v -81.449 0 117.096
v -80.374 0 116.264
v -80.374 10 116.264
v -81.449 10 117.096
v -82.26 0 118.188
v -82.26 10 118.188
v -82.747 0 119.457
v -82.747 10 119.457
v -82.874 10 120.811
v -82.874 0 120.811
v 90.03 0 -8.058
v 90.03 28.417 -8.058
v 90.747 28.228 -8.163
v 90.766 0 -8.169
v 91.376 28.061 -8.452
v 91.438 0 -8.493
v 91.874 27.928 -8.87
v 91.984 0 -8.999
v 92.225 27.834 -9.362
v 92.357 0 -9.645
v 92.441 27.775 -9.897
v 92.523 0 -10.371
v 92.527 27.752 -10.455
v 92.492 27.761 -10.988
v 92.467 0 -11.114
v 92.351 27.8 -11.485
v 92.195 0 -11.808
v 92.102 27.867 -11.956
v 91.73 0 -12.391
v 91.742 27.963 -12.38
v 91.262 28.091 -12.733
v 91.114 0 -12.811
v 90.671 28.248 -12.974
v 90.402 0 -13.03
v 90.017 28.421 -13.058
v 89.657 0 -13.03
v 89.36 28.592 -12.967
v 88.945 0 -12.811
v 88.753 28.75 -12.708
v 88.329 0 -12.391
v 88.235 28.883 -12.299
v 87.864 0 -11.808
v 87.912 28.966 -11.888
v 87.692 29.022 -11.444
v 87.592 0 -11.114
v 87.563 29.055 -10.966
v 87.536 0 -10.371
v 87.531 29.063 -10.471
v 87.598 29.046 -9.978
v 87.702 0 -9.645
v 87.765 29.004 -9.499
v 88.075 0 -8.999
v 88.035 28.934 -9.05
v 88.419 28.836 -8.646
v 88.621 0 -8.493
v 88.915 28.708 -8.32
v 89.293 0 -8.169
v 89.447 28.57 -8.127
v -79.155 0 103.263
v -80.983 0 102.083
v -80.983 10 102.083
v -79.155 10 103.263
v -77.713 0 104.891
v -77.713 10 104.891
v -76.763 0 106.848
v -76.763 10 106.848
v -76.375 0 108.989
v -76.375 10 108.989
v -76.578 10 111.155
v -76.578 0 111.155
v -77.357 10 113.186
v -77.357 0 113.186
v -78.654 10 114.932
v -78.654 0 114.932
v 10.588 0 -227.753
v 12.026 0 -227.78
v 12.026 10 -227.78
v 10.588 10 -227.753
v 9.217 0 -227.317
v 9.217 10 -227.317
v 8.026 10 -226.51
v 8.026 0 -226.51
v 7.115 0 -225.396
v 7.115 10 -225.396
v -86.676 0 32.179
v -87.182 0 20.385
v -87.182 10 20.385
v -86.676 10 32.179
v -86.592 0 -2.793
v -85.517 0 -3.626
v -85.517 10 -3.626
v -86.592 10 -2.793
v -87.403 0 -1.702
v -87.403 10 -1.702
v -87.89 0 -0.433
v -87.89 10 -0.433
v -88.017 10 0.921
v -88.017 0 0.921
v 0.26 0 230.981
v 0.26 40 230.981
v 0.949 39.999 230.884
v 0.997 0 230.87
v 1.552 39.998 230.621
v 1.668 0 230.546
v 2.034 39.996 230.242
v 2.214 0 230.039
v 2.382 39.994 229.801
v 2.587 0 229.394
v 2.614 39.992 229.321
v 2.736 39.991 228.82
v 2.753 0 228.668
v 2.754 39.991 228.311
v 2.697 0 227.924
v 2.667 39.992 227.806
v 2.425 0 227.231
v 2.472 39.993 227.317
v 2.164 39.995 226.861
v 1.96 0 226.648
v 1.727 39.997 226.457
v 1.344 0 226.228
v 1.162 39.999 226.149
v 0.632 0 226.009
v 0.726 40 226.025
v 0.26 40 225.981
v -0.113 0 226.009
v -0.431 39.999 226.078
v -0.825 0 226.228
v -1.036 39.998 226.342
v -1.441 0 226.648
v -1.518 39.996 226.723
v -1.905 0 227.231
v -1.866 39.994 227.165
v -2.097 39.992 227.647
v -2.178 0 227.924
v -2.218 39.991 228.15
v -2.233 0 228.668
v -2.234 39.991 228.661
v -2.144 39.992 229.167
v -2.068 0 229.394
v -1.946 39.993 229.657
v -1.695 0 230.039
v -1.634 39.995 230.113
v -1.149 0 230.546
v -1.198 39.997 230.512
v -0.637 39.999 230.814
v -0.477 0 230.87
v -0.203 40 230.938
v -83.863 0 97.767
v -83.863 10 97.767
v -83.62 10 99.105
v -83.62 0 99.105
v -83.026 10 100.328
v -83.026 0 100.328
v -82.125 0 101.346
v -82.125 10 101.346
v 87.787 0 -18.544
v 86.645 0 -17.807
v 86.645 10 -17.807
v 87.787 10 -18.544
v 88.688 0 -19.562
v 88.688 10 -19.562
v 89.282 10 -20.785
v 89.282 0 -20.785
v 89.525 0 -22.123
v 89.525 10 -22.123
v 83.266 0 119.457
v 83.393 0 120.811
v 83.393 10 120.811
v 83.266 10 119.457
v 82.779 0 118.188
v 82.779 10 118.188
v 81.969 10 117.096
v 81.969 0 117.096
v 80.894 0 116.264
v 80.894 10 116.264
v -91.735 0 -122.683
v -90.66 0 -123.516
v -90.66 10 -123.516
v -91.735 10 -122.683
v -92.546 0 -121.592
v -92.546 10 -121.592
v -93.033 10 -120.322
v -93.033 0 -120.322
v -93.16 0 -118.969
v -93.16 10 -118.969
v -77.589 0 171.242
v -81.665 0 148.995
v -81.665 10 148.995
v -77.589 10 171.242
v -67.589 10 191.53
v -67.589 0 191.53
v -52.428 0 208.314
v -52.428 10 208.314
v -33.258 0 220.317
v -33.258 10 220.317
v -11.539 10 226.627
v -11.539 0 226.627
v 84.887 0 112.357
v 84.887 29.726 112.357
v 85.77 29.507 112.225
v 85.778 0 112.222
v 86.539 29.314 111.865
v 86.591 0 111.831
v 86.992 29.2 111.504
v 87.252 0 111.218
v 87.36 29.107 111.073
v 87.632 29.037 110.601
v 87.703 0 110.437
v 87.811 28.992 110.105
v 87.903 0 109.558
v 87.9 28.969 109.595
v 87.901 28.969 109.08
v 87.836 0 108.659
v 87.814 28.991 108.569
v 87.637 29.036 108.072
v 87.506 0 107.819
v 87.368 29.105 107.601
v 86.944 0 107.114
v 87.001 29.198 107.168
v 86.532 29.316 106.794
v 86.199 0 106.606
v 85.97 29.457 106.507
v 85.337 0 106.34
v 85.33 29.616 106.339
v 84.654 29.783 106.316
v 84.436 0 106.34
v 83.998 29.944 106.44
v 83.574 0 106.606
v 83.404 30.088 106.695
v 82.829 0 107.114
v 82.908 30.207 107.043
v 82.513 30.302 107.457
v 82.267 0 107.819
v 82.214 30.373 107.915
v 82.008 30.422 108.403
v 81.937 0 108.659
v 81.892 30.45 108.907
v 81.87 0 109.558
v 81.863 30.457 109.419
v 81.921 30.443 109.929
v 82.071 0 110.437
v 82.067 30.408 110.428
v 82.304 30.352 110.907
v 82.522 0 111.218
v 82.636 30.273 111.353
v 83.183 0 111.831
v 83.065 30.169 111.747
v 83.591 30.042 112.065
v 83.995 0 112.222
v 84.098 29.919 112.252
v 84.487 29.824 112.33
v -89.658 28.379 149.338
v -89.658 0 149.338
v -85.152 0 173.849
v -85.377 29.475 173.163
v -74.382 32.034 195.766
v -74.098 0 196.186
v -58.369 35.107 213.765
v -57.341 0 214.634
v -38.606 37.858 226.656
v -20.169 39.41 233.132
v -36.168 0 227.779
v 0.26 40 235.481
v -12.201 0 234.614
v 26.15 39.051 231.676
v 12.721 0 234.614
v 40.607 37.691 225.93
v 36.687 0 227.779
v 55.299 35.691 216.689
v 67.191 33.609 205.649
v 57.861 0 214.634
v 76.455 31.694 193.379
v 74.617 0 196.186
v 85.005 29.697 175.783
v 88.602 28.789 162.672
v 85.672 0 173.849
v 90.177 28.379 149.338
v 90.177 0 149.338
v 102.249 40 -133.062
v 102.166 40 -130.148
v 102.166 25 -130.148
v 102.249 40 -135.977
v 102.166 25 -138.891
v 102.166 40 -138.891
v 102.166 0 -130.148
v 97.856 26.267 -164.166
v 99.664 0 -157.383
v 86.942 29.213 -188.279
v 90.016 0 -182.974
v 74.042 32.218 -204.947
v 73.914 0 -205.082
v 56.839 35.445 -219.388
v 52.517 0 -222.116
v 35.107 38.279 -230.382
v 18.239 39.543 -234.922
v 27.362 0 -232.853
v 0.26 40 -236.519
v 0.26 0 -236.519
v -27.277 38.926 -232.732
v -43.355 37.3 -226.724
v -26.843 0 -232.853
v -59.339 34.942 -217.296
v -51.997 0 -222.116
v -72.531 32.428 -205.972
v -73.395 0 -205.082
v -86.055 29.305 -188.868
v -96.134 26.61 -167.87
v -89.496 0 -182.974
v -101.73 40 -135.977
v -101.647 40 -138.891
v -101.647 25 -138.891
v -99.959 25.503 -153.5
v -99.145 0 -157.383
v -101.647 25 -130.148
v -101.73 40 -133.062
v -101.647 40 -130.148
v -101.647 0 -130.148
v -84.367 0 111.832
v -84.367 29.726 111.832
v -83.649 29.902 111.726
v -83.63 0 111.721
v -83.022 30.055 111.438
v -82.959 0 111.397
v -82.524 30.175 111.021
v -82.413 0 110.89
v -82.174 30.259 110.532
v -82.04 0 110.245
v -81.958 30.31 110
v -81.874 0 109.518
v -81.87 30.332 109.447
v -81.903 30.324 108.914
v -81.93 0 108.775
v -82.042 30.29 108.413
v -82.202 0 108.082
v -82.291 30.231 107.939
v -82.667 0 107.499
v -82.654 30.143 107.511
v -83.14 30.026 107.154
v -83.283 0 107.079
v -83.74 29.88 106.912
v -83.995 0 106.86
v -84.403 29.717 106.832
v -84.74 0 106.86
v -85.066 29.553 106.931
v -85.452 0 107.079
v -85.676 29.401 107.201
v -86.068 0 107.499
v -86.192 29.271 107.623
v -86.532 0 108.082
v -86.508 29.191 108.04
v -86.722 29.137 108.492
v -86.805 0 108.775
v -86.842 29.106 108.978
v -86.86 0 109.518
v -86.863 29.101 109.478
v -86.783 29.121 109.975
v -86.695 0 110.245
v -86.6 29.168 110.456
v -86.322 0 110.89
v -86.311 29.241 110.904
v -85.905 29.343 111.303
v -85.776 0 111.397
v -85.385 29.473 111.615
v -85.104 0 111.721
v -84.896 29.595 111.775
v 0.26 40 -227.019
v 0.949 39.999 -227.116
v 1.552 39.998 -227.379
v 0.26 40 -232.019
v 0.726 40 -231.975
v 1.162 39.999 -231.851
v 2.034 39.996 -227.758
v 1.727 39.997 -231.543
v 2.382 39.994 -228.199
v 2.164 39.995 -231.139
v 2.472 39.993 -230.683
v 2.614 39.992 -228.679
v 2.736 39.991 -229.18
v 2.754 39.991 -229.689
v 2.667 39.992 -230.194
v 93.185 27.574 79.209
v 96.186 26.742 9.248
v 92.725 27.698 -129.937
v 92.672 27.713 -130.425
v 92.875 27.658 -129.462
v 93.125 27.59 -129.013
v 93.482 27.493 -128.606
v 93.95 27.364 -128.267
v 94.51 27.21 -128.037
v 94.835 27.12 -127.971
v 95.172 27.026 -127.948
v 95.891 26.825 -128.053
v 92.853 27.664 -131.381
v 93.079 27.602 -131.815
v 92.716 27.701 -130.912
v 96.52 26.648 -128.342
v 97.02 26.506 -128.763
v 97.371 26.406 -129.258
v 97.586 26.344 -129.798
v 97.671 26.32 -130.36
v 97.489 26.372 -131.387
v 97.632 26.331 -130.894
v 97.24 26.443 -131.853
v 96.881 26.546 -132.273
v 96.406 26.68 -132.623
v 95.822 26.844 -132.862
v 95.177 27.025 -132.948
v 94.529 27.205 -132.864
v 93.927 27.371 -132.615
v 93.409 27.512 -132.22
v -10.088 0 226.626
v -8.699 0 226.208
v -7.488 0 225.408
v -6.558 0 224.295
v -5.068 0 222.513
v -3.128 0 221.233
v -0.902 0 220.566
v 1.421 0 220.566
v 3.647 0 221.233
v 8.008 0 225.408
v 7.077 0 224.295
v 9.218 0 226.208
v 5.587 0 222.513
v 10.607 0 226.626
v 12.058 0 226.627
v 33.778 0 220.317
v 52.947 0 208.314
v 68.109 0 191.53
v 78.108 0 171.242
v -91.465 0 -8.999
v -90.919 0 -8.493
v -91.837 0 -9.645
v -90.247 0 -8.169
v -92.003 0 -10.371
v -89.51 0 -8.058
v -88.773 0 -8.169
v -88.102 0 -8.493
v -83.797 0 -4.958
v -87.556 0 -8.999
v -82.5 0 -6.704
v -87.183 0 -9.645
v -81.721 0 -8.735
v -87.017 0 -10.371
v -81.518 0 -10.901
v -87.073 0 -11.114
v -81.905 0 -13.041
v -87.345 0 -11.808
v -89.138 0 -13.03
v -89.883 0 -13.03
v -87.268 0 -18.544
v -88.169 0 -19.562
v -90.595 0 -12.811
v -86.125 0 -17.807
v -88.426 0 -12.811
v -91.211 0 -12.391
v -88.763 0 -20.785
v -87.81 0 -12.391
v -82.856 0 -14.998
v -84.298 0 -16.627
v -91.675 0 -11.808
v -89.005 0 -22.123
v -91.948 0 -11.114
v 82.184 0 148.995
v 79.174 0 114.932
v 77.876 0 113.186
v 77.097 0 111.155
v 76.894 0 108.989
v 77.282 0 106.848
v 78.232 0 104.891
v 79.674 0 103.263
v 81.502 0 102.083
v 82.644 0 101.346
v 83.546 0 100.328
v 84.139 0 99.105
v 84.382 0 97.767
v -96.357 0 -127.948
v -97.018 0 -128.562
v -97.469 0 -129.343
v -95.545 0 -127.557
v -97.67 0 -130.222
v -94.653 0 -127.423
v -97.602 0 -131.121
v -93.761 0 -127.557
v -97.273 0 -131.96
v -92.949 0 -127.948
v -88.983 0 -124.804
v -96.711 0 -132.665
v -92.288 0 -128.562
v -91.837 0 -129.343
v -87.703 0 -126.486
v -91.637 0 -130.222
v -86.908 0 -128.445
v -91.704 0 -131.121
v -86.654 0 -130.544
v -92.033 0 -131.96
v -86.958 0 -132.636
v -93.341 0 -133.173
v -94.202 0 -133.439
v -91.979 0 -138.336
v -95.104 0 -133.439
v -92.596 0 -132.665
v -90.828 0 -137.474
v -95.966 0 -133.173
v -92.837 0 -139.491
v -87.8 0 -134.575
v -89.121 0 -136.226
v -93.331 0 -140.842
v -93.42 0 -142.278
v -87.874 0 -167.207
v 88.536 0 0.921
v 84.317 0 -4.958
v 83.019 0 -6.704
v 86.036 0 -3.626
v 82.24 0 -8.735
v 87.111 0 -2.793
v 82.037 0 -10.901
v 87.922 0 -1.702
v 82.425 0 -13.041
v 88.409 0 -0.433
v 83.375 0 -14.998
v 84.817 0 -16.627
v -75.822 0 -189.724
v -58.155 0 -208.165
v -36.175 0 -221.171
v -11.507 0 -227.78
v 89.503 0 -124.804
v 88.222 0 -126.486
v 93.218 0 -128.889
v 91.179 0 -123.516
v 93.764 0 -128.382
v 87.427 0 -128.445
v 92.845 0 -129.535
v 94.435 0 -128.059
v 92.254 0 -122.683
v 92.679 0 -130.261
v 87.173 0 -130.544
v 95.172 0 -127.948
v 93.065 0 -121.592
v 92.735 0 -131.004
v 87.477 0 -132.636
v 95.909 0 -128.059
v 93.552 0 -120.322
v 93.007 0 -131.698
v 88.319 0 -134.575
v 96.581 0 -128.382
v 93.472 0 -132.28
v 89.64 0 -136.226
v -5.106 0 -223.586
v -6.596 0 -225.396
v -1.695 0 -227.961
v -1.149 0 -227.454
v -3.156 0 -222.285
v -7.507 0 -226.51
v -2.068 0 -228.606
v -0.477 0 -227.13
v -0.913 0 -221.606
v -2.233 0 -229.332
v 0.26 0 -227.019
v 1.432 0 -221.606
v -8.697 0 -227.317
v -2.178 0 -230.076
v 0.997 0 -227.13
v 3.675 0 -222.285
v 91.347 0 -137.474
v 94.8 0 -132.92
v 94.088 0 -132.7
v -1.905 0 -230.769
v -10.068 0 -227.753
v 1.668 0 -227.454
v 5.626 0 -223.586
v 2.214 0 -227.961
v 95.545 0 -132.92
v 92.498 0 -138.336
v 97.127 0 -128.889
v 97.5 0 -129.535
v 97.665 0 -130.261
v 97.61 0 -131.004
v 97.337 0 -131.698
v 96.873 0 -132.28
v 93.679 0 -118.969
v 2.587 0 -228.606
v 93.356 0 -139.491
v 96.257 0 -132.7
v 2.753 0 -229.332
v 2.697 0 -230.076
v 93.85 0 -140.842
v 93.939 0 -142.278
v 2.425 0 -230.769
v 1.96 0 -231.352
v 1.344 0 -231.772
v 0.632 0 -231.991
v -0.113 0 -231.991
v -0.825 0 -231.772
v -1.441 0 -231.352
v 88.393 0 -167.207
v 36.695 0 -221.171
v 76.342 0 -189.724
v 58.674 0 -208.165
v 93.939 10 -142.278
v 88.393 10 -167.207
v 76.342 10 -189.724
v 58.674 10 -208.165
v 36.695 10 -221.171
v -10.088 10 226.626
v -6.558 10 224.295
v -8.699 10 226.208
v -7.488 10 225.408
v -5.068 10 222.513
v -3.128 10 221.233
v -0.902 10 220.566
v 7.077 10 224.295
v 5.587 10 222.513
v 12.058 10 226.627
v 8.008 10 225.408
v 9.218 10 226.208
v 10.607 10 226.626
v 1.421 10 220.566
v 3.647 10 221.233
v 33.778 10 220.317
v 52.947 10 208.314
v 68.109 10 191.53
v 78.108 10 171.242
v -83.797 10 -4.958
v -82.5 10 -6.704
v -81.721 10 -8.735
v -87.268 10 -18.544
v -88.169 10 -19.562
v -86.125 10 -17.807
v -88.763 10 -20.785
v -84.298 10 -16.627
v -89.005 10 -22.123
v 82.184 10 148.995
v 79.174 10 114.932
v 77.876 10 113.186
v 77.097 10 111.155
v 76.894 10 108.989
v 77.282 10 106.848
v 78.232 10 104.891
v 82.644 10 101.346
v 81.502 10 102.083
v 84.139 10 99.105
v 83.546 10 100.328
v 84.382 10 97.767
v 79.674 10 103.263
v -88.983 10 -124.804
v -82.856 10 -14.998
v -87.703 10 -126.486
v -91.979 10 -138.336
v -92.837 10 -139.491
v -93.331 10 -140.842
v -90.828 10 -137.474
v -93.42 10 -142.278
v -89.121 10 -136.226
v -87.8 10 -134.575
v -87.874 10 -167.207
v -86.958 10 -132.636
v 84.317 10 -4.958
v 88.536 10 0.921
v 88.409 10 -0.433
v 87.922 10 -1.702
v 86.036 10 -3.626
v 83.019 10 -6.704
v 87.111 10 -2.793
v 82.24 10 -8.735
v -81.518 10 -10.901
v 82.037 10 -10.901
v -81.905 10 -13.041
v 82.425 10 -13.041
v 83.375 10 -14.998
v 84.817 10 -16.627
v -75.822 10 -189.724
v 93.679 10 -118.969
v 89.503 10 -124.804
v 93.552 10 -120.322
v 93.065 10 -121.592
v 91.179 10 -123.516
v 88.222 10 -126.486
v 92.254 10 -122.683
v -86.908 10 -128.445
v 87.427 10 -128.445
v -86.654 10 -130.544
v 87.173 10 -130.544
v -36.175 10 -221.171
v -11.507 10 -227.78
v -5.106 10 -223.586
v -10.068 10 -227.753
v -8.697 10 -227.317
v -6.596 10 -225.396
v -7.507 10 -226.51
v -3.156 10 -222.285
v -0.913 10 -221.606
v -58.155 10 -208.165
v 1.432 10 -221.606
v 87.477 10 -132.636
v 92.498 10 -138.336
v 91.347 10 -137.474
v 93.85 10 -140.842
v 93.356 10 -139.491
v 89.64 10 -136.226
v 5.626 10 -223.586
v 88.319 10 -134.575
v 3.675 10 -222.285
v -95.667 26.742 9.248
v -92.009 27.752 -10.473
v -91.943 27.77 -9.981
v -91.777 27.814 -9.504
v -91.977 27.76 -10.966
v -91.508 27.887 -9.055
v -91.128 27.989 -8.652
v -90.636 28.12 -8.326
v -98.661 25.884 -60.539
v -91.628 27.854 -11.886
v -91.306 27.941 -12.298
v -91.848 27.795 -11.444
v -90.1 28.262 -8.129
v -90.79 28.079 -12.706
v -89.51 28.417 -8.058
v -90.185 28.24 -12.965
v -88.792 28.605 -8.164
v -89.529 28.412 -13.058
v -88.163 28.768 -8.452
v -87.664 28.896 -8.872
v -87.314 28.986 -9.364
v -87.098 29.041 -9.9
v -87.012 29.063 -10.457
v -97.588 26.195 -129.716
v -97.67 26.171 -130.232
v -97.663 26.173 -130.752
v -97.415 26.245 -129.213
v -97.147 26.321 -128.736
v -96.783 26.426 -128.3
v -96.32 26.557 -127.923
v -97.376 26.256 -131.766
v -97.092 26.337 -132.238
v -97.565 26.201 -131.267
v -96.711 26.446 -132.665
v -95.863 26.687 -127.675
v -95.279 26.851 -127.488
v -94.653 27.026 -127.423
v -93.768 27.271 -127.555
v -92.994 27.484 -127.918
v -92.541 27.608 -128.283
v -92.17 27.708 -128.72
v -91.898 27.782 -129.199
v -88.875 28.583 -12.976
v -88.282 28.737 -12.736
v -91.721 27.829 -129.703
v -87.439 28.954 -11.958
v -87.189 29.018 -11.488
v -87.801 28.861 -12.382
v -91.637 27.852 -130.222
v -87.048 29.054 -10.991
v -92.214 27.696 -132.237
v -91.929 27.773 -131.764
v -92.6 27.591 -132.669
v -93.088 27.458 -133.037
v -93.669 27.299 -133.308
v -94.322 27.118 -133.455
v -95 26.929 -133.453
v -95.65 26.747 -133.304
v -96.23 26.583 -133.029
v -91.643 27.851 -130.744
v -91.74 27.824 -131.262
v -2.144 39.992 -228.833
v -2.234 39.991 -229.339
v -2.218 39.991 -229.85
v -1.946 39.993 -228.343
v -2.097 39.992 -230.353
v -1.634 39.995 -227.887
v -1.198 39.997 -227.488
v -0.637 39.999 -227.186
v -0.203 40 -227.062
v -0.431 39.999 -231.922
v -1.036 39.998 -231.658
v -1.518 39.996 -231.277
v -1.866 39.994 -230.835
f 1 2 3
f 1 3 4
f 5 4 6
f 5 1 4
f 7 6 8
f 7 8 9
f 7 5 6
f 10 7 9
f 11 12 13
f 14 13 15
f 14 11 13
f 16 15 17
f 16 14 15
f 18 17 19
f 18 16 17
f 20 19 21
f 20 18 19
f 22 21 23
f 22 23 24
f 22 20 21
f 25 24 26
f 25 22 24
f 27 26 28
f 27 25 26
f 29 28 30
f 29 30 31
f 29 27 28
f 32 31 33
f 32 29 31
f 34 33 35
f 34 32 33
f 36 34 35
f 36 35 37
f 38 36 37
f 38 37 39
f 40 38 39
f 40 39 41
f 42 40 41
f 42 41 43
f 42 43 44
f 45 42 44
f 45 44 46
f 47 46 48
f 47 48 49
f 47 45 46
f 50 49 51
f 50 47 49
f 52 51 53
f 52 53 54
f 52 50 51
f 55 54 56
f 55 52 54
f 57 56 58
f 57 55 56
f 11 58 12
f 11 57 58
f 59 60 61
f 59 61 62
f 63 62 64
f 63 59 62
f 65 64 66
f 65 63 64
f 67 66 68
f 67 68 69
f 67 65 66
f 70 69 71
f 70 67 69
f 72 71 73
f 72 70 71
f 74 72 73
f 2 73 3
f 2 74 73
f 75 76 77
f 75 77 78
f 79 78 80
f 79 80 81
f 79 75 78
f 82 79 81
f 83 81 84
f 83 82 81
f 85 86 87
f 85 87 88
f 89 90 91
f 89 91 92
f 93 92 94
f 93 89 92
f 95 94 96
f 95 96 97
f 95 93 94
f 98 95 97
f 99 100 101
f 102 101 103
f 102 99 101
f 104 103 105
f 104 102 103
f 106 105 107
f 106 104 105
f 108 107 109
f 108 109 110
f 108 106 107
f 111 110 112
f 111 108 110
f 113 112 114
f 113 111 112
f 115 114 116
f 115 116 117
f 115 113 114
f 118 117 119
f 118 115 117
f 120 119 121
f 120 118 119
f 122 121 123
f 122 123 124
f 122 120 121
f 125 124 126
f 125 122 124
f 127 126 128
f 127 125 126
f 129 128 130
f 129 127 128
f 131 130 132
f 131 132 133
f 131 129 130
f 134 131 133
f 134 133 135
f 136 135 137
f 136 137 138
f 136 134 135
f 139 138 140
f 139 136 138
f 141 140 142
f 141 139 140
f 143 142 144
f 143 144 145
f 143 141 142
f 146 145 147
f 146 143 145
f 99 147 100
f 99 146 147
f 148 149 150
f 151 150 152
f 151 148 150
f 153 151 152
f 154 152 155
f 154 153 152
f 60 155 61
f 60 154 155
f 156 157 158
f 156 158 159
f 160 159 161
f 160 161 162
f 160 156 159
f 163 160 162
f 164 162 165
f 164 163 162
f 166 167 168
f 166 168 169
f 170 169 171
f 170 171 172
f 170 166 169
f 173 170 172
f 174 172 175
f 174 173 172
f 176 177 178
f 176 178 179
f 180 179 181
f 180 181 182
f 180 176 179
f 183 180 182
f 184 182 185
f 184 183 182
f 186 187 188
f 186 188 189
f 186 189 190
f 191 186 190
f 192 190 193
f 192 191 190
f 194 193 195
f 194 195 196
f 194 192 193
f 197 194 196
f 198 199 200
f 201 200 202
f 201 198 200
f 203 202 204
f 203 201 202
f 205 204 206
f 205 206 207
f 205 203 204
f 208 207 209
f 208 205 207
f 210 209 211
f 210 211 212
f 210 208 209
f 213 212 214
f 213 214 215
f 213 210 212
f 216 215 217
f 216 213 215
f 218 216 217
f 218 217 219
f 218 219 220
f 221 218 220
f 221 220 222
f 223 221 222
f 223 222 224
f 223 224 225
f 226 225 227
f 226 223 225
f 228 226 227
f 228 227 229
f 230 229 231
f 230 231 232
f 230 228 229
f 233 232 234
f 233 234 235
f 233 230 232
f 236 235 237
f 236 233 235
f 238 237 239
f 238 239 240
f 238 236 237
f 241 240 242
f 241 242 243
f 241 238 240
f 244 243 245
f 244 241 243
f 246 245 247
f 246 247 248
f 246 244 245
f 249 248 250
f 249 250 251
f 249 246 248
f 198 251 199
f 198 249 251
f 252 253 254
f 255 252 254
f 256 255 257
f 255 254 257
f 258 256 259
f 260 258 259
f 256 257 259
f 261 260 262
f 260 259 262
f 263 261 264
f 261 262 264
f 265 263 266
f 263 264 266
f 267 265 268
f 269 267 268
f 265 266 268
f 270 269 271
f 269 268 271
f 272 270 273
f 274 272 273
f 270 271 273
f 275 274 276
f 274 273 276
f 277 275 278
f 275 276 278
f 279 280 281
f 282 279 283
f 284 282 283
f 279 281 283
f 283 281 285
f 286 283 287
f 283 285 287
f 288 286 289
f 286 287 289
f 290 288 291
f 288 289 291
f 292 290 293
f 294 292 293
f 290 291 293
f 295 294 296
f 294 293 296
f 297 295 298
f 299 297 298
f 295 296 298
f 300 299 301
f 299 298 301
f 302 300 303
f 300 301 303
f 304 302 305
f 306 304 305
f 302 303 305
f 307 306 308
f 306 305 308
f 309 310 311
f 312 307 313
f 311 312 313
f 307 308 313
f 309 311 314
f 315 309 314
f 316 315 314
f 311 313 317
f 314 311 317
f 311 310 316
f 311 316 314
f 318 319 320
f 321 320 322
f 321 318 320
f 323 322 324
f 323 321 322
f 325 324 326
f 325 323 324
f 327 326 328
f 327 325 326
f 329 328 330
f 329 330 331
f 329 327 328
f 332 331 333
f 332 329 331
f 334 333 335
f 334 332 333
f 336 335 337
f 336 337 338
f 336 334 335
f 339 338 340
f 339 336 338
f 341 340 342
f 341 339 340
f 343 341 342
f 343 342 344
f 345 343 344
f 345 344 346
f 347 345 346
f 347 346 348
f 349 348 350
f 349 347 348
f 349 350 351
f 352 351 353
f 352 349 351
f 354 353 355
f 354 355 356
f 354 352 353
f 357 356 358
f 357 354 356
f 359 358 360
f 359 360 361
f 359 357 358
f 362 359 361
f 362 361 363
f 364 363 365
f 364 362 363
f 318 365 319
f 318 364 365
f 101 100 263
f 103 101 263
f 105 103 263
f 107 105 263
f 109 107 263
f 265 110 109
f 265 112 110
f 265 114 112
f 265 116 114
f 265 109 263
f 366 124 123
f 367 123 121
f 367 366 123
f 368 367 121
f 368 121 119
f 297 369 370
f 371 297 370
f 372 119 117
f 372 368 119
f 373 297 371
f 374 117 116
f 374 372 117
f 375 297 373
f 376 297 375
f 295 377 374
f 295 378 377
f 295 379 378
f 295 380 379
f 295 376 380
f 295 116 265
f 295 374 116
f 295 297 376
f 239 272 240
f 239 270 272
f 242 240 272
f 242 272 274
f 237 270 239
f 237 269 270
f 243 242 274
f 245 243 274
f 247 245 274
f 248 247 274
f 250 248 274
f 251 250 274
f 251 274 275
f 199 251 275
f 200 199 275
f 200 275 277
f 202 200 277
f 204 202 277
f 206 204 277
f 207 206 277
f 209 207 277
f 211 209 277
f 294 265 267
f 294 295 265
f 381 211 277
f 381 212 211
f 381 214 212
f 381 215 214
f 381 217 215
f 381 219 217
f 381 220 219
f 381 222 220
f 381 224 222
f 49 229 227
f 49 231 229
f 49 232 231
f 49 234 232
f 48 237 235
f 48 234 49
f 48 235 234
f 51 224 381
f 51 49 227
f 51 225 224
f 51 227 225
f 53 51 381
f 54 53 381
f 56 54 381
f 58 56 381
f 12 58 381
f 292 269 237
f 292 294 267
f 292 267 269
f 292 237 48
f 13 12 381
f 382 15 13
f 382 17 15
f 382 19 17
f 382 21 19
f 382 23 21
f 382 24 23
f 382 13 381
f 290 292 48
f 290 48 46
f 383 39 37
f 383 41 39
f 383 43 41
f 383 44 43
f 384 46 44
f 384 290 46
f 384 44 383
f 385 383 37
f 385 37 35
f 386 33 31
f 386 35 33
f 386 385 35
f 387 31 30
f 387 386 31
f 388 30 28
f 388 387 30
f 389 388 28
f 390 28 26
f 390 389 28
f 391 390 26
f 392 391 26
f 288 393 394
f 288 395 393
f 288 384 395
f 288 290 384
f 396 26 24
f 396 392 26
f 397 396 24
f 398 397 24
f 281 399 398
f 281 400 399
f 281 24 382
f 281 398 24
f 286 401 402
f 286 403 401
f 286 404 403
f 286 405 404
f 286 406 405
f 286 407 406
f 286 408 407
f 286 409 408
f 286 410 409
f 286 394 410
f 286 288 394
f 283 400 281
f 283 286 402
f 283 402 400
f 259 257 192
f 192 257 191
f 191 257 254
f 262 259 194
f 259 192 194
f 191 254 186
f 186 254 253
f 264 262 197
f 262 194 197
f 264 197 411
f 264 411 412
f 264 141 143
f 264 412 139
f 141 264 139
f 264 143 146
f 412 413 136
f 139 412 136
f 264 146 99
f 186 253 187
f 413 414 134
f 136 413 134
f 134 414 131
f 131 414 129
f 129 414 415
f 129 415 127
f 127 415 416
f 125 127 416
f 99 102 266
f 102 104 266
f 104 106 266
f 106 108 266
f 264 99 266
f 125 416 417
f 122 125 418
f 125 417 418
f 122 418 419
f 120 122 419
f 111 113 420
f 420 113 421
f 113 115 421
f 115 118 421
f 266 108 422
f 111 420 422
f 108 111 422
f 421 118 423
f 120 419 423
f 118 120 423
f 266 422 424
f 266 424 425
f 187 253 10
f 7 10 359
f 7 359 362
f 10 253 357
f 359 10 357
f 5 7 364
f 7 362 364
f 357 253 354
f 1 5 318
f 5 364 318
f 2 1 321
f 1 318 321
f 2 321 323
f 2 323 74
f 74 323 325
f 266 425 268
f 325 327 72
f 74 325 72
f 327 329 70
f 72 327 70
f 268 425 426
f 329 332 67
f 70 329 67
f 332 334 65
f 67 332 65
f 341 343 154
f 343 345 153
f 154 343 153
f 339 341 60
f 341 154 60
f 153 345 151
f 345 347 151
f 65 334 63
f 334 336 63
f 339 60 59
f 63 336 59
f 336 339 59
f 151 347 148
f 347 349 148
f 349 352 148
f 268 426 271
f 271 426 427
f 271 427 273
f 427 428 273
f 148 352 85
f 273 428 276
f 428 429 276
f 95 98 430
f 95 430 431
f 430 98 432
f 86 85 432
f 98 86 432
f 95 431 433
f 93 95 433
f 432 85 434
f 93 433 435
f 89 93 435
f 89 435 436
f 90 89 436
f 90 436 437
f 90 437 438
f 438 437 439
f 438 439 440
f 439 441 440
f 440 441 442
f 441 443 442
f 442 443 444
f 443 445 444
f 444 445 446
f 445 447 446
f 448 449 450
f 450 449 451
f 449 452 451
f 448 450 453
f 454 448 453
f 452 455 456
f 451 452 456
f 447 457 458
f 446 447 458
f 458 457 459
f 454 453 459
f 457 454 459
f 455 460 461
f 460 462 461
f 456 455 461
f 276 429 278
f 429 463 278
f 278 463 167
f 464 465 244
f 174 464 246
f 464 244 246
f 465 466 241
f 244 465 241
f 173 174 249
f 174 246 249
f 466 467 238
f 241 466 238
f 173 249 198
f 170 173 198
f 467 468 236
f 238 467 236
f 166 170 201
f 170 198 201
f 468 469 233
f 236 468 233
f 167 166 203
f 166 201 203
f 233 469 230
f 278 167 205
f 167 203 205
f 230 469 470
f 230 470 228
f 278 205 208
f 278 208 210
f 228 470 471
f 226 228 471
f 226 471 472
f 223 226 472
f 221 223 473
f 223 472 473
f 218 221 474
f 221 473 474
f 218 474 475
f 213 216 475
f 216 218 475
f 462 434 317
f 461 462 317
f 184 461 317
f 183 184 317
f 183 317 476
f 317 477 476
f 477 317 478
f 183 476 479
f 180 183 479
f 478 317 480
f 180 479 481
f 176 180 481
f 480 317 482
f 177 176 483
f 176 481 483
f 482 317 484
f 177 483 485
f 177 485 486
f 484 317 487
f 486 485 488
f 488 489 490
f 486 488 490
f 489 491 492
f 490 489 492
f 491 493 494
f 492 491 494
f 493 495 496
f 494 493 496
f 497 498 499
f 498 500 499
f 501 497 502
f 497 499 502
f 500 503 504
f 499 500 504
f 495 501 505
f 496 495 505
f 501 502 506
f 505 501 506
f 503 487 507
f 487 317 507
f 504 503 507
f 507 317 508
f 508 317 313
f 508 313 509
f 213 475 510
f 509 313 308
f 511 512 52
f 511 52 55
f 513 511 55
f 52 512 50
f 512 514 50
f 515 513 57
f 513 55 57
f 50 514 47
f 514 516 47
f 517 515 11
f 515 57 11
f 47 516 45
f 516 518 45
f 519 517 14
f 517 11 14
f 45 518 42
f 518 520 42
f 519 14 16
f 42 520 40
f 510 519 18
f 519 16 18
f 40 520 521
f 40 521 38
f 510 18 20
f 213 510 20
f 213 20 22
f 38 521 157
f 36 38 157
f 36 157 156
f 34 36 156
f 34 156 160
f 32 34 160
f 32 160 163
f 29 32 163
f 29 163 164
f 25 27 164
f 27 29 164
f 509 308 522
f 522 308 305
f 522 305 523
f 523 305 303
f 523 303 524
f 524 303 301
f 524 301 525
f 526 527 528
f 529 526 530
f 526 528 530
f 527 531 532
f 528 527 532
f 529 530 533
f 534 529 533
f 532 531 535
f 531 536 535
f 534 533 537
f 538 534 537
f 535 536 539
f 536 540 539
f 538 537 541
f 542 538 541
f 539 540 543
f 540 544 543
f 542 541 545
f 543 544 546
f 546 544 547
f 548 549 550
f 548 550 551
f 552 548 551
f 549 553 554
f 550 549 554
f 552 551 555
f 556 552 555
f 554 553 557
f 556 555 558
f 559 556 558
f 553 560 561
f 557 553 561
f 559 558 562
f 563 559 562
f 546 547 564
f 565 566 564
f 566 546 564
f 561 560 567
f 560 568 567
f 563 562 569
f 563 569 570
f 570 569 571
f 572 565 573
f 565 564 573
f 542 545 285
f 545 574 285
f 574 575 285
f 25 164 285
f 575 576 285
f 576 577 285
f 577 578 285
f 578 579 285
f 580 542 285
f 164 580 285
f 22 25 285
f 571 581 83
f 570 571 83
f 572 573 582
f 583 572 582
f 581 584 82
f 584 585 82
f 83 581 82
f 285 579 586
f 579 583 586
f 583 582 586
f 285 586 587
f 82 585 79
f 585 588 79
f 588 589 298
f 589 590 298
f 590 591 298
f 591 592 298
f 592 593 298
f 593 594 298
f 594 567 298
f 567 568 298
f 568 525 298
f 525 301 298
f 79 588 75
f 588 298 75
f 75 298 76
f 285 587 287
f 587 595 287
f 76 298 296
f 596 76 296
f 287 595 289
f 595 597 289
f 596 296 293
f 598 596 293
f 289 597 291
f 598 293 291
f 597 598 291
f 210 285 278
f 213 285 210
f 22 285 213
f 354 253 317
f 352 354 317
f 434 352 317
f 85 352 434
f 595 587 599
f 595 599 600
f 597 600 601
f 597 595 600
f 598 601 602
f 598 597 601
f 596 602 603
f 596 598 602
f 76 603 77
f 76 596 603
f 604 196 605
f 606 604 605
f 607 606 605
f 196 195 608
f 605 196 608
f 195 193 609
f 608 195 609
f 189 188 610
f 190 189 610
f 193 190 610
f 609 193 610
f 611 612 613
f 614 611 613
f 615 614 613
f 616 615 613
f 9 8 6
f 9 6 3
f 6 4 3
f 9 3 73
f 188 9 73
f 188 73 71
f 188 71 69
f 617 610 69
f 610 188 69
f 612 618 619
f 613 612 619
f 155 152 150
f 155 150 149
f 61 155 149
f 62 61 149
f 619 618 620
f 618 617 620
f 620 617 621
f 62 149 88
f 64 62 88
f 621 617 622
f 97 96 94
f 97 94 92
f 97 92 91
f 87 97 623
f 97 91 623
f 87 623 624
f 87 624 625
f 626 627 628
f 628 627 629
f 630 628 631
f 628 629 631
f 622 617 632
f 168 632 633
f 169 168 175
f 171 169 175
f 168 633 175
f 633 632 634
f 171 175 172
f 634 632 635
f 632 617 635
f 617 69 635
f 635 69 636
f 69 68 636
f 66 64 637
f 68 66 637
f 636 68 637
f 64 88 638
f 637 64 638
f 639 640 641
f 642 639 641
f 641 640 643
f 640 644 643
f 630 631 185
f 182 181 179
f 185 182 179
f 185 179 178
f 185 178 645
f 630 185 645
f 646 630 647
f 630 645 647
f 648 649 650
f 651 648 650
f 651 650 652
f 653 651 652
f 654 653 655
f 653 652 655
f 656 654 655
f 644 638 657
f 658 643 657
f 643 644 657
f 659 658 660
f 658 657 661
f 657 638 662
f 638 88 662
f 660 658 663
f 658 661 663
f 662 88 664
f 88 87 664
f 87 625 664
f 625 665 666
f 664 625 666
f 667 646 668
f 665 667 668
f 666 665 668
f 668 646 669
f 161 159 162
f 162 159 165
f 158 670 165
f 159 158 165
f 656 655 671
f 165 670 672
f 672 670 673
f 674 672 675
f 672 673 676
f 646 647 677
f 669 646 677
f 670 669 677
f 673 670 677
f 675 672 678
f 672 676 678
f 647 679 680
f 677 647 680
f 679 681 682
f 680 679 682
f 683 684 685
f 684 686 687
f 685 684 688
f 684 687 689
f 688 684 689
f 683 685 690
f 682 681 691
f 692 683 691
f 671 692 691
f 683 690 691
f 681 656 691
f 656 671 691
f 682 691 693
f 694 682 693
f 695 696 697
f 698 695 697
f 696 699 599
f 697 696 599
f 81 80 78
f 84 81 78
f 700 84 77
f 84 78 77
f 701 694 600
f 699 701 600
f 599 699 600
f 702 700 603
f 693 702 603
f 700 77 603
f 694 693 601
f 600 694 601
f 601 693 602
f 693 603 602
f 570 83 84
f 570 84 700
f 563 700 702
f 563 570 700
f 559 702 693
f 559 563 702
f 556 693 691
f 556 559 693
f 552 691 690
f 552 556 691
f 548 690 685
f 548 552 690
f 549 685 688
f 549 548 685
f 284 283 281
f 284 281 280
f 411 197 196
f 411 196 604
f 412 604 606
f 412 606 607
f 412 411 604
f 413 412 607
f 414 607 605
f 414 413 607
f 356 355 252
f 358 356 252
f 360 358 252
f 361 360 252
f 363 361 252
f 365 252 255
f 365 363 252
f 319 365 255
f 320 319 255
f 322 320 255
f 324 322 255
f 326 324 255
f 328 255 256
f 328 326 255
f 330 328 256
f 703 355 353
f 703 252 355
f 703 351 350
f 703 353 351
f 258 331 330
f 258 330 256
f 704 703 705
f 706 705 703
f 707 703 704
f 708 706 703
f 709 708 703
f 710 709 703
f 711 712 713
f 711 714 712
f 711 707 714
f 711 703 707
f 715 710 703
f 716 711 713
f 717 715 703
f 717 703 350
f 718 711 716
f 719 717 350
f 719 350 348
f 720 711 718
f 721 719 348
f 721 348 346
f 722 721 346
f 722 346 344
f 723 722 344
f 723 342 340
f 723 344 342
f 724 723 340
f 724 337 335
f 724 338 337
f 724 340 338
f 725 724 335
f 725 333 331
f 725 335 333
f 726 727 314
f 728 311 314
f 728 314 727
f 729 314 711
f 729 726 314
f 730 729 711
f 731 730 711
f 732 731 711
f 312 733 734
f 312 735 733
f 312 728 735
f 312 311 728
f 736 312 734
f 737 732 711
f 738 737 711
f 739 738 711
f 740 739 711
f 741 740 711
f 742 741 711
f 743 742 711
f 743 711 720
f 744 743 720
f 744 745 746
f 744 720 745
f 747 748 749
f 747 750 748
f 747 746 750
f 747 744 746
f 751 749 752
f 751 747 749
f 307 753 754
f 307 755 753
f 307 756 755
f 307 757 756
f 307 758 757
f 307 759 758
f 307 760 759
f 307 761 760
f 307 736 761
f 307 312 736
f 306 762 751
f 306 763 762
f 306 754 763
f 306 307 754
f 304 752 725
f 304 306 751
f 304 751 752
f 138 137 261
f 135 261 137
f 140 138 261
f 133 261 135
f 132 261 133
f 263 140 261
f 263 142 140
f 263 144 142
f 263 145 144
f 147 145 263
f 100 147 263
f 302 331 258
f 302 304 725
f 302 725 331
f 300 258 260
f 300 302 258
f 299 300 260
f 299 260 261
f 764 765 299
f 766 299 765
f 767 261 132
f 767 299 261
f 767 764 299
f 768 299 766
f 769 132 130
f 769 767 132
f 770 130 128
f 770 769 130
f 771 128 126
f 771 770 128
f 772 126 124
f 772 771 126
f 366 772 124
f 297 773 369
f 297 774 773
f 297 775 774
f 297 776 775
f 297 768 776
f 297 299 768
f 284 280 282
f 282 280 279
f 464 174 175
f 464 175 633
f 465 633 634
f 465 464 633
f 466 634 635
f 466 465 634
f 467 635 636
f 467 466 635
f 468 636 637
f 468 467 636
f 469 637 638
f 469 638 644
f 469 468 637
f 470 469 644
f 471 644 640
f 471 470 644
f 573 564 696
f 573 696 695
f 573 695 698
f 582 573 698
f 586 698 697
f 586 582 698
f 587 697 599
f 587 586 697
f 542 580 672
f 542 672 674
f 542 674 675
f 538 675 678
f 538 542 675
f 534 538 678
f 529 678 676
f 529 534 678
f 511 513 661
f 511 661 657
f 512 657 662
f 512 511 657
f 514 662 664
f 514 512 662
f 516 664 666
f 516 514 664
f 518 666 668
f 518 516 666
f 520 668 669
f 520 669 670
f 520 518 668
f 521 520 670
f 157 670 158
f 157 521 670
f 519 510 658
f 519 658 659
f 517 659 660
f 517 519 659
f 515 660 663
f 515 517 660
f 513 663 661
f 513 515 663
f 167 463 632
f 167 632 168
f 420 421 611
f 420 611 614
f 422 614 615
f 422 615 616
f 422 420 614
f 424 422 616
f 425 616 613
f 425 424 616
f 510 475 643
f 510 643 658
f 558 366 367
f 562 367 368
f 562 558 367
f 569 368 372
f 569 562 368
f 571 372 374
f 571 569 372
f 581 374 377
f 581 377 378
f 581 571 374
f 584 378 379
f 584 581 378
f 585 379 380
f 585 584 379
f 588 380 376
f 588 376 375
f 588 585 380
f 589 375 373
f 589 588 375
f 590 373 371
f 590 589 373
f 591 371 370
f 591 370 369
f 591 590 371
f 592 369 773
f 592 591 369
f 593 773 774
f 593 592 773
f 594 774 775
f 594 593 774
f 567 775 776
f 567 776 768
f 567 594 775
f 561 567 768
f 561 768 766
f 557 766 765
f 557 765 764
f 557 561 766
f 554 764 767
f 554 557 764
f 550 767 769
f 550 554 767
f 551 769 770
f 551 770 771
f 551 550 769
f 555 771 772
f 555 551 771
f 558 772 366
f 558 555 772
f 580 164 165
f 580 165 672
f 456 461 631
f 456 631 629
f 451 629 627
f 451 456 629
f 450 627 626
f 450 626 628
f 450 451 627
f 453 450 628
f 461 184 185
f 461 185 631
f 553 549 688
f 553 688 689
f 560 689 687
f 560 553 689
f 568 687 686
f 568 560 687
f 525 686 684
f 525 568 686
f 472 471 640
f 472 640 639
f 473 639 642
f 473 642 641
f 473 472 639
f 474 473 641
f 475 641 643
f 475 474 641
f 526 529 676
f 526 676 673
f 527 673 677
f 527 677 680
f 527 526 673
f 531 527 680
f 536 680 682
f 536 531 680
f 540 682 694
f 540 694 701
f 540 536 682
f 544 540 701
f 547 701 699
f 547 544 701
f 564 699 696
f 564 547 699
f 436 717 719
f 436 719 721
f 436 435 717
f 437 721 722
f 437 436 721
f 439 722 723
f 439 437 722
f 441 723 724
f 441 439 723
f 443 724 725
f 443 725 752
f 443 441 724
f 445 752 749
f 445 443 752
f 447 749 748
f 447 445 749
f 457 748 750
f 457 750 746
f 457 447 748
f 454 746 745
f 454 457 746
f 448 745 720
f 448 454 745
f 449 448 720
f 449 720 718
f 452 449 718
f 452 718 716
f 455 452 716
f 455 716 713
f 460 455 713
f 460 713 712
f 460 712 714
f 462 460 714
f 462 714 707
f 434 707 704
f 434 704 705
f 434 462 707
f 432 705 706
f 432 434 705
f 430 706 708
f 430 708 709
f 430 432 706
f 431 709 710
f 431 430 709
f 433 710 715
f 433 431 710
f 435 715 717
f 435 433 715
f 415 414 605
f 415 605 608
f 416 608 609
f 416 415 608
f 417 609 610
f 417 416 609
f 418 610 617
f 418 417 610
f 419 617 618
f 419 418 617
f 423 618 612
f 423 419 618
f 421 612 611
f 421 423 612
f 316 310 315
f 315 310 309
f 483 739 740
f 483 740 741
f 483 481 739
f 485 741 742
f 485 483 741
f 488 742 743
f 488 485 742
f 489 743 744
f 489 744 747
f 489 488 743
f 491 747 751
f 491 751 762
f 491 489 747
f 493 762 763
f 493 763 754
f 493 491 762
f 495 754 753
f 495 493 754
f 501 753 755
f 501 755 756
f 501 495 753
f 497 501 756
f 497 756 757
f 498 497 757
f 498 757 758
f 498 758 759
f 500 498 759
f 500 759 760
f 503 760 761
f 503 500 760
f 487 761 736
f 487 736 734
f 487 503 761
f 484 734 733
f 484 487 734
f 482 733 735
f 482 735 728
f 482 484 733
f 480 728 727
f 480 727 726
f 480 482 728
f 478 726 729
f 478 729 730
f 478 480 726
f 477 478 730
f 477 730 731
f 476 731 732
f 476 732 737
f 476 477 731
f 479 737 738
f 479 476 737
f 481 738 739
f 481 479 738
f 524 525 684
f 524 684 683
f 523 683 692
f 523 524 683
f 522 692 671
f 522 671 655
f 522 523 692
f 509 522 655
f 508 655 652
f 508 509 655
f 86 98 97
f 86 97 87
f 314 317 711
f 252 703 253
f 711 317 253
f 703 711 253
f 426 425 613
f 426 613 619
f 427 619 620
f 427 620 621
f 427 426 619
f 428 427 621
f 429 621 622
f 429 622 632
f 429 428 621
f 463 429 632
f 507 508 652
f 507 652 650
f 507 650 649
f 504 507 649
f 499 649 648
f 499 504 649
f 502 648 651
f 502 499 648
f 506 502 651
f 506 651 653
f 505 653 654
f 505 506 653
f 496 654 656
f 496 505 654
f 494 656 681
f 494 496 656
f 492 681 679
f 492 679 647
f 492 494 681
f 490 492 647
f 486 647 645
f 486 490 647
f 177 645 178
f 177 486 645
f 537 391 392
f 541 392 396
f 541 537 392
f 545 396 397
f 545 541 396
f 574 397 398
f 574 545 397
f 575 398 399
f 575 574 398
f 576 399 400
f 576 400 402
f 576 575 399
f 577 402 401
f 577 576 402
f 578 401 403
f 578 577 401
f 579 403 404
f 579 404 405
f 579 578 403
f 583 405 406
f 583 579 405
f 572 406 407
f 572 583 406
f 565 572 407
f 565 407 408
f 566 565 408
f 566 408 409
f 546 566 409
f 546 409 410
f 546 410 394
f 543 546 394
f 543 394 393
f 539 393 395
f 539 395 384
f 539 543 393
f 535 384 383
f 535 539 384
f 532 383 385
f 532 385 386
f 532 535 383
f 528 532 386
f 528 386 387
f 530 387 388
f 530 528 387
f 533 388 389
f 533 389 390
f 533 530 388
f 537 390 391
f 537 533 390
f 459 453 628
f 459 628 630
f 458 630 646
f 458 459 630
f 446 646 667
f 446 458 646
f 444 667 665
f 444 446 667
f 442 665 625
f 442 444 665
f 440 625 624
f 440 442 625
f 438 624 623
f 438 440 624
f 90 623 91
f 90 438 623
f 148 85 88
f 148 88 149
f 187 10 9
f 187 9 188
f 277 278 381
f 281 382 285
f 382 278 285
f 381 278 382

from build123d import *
from build123d.topology import SkipClean

# Parameters (mm, degrees)
SKETCH1_R               = 2.5
SKETCH1_R_2             = 3.025
BOSS_EXTRUDE1_DEPTH     = 10
BOSS_EXTRUDE2_START     = 10
SKETCH1_3_R             = 2.5
SKETCH1_3_R_2           = 3.025
BOSS_EXTRUDE2_DEPTH     = 30
CUT_EXTRUDE1_DEPTH      = 261.765043932
CUT_EXTRUDE1_DEPTH_BACK = 261.765043932


with BuildPart() as part:
    # Sketch1 → Boss-Extrude1 (new body)
    with BuildSketch(Plane(origin=(0, 0, 0), x_dir=(1, 0, 0), z_dir=(0, 1, 0))):
        with BuildLine():
            ThreePointArc((-89.657665168, -149.337855292), (0.259643783, -235.480712435), (90.176952733, -149.337855292))
            Line((90.176952733, -149.337855292), (102.16592726, 130.147858994))
            ThreePointArc((102.16592726, 130.147858994), (0.259643783, 236.519287565), (-101.646639695, 130.147858994))
            Line((-101.646639695, 130.147858994), (-89.657665168, -149.337855292))
        make_face()
        with Locations((0.259643783, -228.480712435)):
            Circle(SKETCH1_R, mode=Mode.SUBTRACT)
        with Locations((-84.367356936, -109.331631542)):
            Circle(SKETCH1_R, mode=Mode.SUBTRACT)
        with Locations((84.886644501, -109.331631542)):
            Circle(SKETCH1_R_2, mode=Mode.SUBTRACT)
        with Locations((-89.510214078, 10.558113726)):
            Circle(SKETCH1_R, mode=Mode.SUBTRACT)
        with Locations((-94.653071221, 130.447858994)):
            Circle(SKETCH1_R_2, mode=Mode.SUBTRACT)
        with BuildLine():
            Line((-89.00538555, 22.122937467), (-93.159737328, 118.968749538))
            ThreePointArc((-93.159737328, 118.968749538), (-92.545843606, 121.591841947), (-90.660000485, 123.515659768))
            ThreePointArc((-90.660000485, 123.515659768), (-86.653647828, 130.543907811), (-90.827597046, 137.473935234))
            ThreePointArc((-90.827597046, 137.473935234), (-92.837020914, 139.491004193), (-93.419614983, 142.277926441))
            ThreePointArc((-93.419614983, 142.277926441), (-67.617766725, 199.547413348), (-11.506691914, 227.779961722))
            ThreePointArc((-11.506691914, 227.779961722), (-8.697361943, 227.31734246), (-6.59602808, 225.396210642))
            ThreePointArc((-6.59602808, 225.396210642), (0.259643783, 221.519287565), (7.115315645, 225.396210642))
            ThreePointArc((7.115315645, 225.396210642), (9.216649508, 227.31734246), (12.025979479, 227.779961722))
            ThreePointArc((12.025979479, 227.779961722), (68.13705429, 199.547413348), (93.938902548, 142.277926441))
            ThreePointArc((93.938902548, 142.277926441), (93.356308479, 139.491004193), (91.346884611, 137.473935234))
            ThreePointArc((91.346884611, 137.473935234), (87.172935393, 130.543907811), (91.17928805, 123.515659768))
            ThreePointArc((91.17928805, 123.515659768), (93.065131171, 121.591841947), (93.679024893, 118.968749538))
            Line((93.679024893, 118.968749538), (91.627693163, 71.148319825))
            Line((91.627693163, 71.148319825), (89.524673116, 22.122937467))
            ThreePointArc((89.524673116, 22.122937467), (88.688404599, 19.562052023), (86.644741901, 17.806796467))
            ThreePointArc((86.644741901, 17.806796467), (82.036851959, 10.900970869), (86.036430907, 3.625914501))
            ThreePointArc((86.036430907, 3.625914501), (87.922274029, 1.702096679), (88.53616775, -0.920995729))
            Line((88.53616775, -0.920995729), (84.381815973, -97.766807801))
            ThreePointArc((84.381815973, -97.766807801), (83.545547456, -100.327693245), (81.501884759, -102.082948801))
            ThreePointArc((81.501884759, -102.082948801), (76.893994816, -108.988774399), (80.893573765, -116.263830767))
            ThreePointArc((80.893573765, -116.263830767), (82.779416886, -118.187648589), (83.393310607, -120.810740997))
            Line((83.393310607, -120.810740997), (82.184303049, -148.994998149))
            ThreePointArc((82.184303049, -148.994998149), (61.109482621, -200.447039521), (12.058029185, -226.627481329))
            ThreePointArc((12.058029185, -226.627481329), (9.218317346, -226.207678989), (7.077472495, -224.295355623))
            ThreePointArc((7.077472495, -224.295355623), (0.259643783, -220.480712435), (-6.55818493, -224.295355623))
            ThreePointArc((-6.55818493, -224.295355623), (-8.699029781, -226.207678989), (-11.53874162, -226.627481329))
            ThreePointArc((-11.53874162, -226.627481329), (-60.590195056, -200.447039521), (-81.665015484, -148.994998149))
            Line((-81.665015484, -148.994998149), (-82.874023042, -120.810740997))
            ThreePointArc((-82.874023042, -120.810740997), (-82.260129321, -118.187648589), (-80.3742862, -116.263830767))
            ThreePointArc((-80.3742862, -116.263830767), (-76.374707251, -108.988774399), (-80.982597194, -102.082948801))
            ThreePointArc((-80.982597194, -102.082948801), (-83.026259891, -100.327693245), (-83.862528408, -97.766807801))
            Line((-83.862528408, -97.766807801), (-86.67600341, -32.179374194))
            Line((-86.67600341, -32.179374194), (-87.181946752, -20.384876194))
            Line((-87.181946752, -20.384876194), (-88.016880185, -0.920995729))
            ThreePointArc((-88.016880185, -0.920995729), (-87.402986464, 1.702096679), (-85.517143342, 3.625914501))
            ThreePointArc((-85.517143342, 3.625914501), (-81.517564394, 10.900970869), (-86.125454336, 17.806796467))
            ThreePointArc((-86.125454336, 17.806796467), (-88.169117034, 19.562052023), (-89.00538555, 22.122937467))
        make_face(mode=Mode.SUBTRACT)
        with Locations((90.029501643, 10.558113726)):
            Circle(SKETCH1_R, mode=Mode.SUBTRACT)
        with Locations((0.259643783, 229.519287565)):
            Circle(SKETCH1_R, mode=Mode.SUBTRACT)
        with Locations((95.172358786, 130.447858994)):
            Circle(SKETCH1_R, mode=Mode.SUBTRACT)
    extrude(amount=BOSS_EXTRUDE1_DEPTH)

    # Sketch1<3> → Boss-Extrude2 (add)
    with BuildSketch(Plane(origin=(0, 0, 0), x_dir=(1, 0, 0), z_dir=(0, 1, 0)).offset(BOSS_EXTRUDE2_START)):
        with BuildLine():
            ThreePointArc((-89.657665168, -149.337855292), (0.259643783, -235.480712435), (90.176952733, -149.337855292))
            Line((90.176952733, -149.337855292), (102.16592726, 130.147858994))
            ThreePointArc((102.16592726, 130.147858994), (0.259643783, 236.519287565), (-101.646639695, 130.147858994))
            Line((-101.646639695, 130.147858994), (-89.657665168, -149.337855292))
        make_face()
        with Locations((0.259643783, -228.480712435)):
            Circle(SKETCH1_3_R, mode=Mode.SUBTRACT)
        with Locations((-84.367356936, -109.331631542)):
            Circle(SKETCH1_3_R, mode=Mode.SUBTRACT)
        with Locations((84.886644501, -109.331631542)):
            Circle(SKETCH1_3_R_2, mode=Mode.SUBTRACT)
        with Locations((-89.510214078, 10.558113726)):
            Circle(SKETCH1_3_R, mode=Mode.SUBTRACT)
        with Locations((-94.653071221, 130.447858994)):
            Circle(SKETCH1_3_R_2, mode=Mode.SUBTRACT)
        with Locations((90.029501643, 10.558113726)):
            Circle(SKETCH1_3_R, mode=Mode.SUBTRACT)
        with Locations((0.259643783, 229.519287565)):
            Circle(SKETCH1_3_R, mode=Mode.SUBTRACT)
        with Locations((95.172358786, 130.447858994)):
            Circle(SKETCH1_3_R, mode=Mode.SUBTRACT)
    extrude(amount=BOSS_EXTRUDE2_DEPTH)

    # Sketch2 → Cut-Extrude1 (cut, two sides: drawn at the far end of the back side and taken through both)
    with SkipClean():  # the faces are left unmerged after this step: merging them gives an invalid solid
        with BuildSketch(Plane.XY.offset(-CUT_EXTRUDE1_DEPTH_BACK)):
            with BuildLine():
                Line((102.16592726, 40), (0.259643782, 40))
                ThreePointArc((0.259643782, 40), (51.761805417, 36.229905144), (102.16592726, 25))
                Line((102.16592726, 25), (102.16592726, 40))
            make_face()
            with BuildLine():
                Line((-101.646639695, 40), (-101.646639695, 25))
                ThreePointArc((-101.646639695, 25), (-51.242517852, 36.229905144), (0.259643782, 40))
                Line((0.259643782, 40), (-101.646639695, 40))
            make_face()
        extrude(amount=CUT_EXTRUDE1_DEPTH + CUT_EXTRUDE1_DEPTH_BACK, mode=Mode.SUBTRACT)


solid = part.part
